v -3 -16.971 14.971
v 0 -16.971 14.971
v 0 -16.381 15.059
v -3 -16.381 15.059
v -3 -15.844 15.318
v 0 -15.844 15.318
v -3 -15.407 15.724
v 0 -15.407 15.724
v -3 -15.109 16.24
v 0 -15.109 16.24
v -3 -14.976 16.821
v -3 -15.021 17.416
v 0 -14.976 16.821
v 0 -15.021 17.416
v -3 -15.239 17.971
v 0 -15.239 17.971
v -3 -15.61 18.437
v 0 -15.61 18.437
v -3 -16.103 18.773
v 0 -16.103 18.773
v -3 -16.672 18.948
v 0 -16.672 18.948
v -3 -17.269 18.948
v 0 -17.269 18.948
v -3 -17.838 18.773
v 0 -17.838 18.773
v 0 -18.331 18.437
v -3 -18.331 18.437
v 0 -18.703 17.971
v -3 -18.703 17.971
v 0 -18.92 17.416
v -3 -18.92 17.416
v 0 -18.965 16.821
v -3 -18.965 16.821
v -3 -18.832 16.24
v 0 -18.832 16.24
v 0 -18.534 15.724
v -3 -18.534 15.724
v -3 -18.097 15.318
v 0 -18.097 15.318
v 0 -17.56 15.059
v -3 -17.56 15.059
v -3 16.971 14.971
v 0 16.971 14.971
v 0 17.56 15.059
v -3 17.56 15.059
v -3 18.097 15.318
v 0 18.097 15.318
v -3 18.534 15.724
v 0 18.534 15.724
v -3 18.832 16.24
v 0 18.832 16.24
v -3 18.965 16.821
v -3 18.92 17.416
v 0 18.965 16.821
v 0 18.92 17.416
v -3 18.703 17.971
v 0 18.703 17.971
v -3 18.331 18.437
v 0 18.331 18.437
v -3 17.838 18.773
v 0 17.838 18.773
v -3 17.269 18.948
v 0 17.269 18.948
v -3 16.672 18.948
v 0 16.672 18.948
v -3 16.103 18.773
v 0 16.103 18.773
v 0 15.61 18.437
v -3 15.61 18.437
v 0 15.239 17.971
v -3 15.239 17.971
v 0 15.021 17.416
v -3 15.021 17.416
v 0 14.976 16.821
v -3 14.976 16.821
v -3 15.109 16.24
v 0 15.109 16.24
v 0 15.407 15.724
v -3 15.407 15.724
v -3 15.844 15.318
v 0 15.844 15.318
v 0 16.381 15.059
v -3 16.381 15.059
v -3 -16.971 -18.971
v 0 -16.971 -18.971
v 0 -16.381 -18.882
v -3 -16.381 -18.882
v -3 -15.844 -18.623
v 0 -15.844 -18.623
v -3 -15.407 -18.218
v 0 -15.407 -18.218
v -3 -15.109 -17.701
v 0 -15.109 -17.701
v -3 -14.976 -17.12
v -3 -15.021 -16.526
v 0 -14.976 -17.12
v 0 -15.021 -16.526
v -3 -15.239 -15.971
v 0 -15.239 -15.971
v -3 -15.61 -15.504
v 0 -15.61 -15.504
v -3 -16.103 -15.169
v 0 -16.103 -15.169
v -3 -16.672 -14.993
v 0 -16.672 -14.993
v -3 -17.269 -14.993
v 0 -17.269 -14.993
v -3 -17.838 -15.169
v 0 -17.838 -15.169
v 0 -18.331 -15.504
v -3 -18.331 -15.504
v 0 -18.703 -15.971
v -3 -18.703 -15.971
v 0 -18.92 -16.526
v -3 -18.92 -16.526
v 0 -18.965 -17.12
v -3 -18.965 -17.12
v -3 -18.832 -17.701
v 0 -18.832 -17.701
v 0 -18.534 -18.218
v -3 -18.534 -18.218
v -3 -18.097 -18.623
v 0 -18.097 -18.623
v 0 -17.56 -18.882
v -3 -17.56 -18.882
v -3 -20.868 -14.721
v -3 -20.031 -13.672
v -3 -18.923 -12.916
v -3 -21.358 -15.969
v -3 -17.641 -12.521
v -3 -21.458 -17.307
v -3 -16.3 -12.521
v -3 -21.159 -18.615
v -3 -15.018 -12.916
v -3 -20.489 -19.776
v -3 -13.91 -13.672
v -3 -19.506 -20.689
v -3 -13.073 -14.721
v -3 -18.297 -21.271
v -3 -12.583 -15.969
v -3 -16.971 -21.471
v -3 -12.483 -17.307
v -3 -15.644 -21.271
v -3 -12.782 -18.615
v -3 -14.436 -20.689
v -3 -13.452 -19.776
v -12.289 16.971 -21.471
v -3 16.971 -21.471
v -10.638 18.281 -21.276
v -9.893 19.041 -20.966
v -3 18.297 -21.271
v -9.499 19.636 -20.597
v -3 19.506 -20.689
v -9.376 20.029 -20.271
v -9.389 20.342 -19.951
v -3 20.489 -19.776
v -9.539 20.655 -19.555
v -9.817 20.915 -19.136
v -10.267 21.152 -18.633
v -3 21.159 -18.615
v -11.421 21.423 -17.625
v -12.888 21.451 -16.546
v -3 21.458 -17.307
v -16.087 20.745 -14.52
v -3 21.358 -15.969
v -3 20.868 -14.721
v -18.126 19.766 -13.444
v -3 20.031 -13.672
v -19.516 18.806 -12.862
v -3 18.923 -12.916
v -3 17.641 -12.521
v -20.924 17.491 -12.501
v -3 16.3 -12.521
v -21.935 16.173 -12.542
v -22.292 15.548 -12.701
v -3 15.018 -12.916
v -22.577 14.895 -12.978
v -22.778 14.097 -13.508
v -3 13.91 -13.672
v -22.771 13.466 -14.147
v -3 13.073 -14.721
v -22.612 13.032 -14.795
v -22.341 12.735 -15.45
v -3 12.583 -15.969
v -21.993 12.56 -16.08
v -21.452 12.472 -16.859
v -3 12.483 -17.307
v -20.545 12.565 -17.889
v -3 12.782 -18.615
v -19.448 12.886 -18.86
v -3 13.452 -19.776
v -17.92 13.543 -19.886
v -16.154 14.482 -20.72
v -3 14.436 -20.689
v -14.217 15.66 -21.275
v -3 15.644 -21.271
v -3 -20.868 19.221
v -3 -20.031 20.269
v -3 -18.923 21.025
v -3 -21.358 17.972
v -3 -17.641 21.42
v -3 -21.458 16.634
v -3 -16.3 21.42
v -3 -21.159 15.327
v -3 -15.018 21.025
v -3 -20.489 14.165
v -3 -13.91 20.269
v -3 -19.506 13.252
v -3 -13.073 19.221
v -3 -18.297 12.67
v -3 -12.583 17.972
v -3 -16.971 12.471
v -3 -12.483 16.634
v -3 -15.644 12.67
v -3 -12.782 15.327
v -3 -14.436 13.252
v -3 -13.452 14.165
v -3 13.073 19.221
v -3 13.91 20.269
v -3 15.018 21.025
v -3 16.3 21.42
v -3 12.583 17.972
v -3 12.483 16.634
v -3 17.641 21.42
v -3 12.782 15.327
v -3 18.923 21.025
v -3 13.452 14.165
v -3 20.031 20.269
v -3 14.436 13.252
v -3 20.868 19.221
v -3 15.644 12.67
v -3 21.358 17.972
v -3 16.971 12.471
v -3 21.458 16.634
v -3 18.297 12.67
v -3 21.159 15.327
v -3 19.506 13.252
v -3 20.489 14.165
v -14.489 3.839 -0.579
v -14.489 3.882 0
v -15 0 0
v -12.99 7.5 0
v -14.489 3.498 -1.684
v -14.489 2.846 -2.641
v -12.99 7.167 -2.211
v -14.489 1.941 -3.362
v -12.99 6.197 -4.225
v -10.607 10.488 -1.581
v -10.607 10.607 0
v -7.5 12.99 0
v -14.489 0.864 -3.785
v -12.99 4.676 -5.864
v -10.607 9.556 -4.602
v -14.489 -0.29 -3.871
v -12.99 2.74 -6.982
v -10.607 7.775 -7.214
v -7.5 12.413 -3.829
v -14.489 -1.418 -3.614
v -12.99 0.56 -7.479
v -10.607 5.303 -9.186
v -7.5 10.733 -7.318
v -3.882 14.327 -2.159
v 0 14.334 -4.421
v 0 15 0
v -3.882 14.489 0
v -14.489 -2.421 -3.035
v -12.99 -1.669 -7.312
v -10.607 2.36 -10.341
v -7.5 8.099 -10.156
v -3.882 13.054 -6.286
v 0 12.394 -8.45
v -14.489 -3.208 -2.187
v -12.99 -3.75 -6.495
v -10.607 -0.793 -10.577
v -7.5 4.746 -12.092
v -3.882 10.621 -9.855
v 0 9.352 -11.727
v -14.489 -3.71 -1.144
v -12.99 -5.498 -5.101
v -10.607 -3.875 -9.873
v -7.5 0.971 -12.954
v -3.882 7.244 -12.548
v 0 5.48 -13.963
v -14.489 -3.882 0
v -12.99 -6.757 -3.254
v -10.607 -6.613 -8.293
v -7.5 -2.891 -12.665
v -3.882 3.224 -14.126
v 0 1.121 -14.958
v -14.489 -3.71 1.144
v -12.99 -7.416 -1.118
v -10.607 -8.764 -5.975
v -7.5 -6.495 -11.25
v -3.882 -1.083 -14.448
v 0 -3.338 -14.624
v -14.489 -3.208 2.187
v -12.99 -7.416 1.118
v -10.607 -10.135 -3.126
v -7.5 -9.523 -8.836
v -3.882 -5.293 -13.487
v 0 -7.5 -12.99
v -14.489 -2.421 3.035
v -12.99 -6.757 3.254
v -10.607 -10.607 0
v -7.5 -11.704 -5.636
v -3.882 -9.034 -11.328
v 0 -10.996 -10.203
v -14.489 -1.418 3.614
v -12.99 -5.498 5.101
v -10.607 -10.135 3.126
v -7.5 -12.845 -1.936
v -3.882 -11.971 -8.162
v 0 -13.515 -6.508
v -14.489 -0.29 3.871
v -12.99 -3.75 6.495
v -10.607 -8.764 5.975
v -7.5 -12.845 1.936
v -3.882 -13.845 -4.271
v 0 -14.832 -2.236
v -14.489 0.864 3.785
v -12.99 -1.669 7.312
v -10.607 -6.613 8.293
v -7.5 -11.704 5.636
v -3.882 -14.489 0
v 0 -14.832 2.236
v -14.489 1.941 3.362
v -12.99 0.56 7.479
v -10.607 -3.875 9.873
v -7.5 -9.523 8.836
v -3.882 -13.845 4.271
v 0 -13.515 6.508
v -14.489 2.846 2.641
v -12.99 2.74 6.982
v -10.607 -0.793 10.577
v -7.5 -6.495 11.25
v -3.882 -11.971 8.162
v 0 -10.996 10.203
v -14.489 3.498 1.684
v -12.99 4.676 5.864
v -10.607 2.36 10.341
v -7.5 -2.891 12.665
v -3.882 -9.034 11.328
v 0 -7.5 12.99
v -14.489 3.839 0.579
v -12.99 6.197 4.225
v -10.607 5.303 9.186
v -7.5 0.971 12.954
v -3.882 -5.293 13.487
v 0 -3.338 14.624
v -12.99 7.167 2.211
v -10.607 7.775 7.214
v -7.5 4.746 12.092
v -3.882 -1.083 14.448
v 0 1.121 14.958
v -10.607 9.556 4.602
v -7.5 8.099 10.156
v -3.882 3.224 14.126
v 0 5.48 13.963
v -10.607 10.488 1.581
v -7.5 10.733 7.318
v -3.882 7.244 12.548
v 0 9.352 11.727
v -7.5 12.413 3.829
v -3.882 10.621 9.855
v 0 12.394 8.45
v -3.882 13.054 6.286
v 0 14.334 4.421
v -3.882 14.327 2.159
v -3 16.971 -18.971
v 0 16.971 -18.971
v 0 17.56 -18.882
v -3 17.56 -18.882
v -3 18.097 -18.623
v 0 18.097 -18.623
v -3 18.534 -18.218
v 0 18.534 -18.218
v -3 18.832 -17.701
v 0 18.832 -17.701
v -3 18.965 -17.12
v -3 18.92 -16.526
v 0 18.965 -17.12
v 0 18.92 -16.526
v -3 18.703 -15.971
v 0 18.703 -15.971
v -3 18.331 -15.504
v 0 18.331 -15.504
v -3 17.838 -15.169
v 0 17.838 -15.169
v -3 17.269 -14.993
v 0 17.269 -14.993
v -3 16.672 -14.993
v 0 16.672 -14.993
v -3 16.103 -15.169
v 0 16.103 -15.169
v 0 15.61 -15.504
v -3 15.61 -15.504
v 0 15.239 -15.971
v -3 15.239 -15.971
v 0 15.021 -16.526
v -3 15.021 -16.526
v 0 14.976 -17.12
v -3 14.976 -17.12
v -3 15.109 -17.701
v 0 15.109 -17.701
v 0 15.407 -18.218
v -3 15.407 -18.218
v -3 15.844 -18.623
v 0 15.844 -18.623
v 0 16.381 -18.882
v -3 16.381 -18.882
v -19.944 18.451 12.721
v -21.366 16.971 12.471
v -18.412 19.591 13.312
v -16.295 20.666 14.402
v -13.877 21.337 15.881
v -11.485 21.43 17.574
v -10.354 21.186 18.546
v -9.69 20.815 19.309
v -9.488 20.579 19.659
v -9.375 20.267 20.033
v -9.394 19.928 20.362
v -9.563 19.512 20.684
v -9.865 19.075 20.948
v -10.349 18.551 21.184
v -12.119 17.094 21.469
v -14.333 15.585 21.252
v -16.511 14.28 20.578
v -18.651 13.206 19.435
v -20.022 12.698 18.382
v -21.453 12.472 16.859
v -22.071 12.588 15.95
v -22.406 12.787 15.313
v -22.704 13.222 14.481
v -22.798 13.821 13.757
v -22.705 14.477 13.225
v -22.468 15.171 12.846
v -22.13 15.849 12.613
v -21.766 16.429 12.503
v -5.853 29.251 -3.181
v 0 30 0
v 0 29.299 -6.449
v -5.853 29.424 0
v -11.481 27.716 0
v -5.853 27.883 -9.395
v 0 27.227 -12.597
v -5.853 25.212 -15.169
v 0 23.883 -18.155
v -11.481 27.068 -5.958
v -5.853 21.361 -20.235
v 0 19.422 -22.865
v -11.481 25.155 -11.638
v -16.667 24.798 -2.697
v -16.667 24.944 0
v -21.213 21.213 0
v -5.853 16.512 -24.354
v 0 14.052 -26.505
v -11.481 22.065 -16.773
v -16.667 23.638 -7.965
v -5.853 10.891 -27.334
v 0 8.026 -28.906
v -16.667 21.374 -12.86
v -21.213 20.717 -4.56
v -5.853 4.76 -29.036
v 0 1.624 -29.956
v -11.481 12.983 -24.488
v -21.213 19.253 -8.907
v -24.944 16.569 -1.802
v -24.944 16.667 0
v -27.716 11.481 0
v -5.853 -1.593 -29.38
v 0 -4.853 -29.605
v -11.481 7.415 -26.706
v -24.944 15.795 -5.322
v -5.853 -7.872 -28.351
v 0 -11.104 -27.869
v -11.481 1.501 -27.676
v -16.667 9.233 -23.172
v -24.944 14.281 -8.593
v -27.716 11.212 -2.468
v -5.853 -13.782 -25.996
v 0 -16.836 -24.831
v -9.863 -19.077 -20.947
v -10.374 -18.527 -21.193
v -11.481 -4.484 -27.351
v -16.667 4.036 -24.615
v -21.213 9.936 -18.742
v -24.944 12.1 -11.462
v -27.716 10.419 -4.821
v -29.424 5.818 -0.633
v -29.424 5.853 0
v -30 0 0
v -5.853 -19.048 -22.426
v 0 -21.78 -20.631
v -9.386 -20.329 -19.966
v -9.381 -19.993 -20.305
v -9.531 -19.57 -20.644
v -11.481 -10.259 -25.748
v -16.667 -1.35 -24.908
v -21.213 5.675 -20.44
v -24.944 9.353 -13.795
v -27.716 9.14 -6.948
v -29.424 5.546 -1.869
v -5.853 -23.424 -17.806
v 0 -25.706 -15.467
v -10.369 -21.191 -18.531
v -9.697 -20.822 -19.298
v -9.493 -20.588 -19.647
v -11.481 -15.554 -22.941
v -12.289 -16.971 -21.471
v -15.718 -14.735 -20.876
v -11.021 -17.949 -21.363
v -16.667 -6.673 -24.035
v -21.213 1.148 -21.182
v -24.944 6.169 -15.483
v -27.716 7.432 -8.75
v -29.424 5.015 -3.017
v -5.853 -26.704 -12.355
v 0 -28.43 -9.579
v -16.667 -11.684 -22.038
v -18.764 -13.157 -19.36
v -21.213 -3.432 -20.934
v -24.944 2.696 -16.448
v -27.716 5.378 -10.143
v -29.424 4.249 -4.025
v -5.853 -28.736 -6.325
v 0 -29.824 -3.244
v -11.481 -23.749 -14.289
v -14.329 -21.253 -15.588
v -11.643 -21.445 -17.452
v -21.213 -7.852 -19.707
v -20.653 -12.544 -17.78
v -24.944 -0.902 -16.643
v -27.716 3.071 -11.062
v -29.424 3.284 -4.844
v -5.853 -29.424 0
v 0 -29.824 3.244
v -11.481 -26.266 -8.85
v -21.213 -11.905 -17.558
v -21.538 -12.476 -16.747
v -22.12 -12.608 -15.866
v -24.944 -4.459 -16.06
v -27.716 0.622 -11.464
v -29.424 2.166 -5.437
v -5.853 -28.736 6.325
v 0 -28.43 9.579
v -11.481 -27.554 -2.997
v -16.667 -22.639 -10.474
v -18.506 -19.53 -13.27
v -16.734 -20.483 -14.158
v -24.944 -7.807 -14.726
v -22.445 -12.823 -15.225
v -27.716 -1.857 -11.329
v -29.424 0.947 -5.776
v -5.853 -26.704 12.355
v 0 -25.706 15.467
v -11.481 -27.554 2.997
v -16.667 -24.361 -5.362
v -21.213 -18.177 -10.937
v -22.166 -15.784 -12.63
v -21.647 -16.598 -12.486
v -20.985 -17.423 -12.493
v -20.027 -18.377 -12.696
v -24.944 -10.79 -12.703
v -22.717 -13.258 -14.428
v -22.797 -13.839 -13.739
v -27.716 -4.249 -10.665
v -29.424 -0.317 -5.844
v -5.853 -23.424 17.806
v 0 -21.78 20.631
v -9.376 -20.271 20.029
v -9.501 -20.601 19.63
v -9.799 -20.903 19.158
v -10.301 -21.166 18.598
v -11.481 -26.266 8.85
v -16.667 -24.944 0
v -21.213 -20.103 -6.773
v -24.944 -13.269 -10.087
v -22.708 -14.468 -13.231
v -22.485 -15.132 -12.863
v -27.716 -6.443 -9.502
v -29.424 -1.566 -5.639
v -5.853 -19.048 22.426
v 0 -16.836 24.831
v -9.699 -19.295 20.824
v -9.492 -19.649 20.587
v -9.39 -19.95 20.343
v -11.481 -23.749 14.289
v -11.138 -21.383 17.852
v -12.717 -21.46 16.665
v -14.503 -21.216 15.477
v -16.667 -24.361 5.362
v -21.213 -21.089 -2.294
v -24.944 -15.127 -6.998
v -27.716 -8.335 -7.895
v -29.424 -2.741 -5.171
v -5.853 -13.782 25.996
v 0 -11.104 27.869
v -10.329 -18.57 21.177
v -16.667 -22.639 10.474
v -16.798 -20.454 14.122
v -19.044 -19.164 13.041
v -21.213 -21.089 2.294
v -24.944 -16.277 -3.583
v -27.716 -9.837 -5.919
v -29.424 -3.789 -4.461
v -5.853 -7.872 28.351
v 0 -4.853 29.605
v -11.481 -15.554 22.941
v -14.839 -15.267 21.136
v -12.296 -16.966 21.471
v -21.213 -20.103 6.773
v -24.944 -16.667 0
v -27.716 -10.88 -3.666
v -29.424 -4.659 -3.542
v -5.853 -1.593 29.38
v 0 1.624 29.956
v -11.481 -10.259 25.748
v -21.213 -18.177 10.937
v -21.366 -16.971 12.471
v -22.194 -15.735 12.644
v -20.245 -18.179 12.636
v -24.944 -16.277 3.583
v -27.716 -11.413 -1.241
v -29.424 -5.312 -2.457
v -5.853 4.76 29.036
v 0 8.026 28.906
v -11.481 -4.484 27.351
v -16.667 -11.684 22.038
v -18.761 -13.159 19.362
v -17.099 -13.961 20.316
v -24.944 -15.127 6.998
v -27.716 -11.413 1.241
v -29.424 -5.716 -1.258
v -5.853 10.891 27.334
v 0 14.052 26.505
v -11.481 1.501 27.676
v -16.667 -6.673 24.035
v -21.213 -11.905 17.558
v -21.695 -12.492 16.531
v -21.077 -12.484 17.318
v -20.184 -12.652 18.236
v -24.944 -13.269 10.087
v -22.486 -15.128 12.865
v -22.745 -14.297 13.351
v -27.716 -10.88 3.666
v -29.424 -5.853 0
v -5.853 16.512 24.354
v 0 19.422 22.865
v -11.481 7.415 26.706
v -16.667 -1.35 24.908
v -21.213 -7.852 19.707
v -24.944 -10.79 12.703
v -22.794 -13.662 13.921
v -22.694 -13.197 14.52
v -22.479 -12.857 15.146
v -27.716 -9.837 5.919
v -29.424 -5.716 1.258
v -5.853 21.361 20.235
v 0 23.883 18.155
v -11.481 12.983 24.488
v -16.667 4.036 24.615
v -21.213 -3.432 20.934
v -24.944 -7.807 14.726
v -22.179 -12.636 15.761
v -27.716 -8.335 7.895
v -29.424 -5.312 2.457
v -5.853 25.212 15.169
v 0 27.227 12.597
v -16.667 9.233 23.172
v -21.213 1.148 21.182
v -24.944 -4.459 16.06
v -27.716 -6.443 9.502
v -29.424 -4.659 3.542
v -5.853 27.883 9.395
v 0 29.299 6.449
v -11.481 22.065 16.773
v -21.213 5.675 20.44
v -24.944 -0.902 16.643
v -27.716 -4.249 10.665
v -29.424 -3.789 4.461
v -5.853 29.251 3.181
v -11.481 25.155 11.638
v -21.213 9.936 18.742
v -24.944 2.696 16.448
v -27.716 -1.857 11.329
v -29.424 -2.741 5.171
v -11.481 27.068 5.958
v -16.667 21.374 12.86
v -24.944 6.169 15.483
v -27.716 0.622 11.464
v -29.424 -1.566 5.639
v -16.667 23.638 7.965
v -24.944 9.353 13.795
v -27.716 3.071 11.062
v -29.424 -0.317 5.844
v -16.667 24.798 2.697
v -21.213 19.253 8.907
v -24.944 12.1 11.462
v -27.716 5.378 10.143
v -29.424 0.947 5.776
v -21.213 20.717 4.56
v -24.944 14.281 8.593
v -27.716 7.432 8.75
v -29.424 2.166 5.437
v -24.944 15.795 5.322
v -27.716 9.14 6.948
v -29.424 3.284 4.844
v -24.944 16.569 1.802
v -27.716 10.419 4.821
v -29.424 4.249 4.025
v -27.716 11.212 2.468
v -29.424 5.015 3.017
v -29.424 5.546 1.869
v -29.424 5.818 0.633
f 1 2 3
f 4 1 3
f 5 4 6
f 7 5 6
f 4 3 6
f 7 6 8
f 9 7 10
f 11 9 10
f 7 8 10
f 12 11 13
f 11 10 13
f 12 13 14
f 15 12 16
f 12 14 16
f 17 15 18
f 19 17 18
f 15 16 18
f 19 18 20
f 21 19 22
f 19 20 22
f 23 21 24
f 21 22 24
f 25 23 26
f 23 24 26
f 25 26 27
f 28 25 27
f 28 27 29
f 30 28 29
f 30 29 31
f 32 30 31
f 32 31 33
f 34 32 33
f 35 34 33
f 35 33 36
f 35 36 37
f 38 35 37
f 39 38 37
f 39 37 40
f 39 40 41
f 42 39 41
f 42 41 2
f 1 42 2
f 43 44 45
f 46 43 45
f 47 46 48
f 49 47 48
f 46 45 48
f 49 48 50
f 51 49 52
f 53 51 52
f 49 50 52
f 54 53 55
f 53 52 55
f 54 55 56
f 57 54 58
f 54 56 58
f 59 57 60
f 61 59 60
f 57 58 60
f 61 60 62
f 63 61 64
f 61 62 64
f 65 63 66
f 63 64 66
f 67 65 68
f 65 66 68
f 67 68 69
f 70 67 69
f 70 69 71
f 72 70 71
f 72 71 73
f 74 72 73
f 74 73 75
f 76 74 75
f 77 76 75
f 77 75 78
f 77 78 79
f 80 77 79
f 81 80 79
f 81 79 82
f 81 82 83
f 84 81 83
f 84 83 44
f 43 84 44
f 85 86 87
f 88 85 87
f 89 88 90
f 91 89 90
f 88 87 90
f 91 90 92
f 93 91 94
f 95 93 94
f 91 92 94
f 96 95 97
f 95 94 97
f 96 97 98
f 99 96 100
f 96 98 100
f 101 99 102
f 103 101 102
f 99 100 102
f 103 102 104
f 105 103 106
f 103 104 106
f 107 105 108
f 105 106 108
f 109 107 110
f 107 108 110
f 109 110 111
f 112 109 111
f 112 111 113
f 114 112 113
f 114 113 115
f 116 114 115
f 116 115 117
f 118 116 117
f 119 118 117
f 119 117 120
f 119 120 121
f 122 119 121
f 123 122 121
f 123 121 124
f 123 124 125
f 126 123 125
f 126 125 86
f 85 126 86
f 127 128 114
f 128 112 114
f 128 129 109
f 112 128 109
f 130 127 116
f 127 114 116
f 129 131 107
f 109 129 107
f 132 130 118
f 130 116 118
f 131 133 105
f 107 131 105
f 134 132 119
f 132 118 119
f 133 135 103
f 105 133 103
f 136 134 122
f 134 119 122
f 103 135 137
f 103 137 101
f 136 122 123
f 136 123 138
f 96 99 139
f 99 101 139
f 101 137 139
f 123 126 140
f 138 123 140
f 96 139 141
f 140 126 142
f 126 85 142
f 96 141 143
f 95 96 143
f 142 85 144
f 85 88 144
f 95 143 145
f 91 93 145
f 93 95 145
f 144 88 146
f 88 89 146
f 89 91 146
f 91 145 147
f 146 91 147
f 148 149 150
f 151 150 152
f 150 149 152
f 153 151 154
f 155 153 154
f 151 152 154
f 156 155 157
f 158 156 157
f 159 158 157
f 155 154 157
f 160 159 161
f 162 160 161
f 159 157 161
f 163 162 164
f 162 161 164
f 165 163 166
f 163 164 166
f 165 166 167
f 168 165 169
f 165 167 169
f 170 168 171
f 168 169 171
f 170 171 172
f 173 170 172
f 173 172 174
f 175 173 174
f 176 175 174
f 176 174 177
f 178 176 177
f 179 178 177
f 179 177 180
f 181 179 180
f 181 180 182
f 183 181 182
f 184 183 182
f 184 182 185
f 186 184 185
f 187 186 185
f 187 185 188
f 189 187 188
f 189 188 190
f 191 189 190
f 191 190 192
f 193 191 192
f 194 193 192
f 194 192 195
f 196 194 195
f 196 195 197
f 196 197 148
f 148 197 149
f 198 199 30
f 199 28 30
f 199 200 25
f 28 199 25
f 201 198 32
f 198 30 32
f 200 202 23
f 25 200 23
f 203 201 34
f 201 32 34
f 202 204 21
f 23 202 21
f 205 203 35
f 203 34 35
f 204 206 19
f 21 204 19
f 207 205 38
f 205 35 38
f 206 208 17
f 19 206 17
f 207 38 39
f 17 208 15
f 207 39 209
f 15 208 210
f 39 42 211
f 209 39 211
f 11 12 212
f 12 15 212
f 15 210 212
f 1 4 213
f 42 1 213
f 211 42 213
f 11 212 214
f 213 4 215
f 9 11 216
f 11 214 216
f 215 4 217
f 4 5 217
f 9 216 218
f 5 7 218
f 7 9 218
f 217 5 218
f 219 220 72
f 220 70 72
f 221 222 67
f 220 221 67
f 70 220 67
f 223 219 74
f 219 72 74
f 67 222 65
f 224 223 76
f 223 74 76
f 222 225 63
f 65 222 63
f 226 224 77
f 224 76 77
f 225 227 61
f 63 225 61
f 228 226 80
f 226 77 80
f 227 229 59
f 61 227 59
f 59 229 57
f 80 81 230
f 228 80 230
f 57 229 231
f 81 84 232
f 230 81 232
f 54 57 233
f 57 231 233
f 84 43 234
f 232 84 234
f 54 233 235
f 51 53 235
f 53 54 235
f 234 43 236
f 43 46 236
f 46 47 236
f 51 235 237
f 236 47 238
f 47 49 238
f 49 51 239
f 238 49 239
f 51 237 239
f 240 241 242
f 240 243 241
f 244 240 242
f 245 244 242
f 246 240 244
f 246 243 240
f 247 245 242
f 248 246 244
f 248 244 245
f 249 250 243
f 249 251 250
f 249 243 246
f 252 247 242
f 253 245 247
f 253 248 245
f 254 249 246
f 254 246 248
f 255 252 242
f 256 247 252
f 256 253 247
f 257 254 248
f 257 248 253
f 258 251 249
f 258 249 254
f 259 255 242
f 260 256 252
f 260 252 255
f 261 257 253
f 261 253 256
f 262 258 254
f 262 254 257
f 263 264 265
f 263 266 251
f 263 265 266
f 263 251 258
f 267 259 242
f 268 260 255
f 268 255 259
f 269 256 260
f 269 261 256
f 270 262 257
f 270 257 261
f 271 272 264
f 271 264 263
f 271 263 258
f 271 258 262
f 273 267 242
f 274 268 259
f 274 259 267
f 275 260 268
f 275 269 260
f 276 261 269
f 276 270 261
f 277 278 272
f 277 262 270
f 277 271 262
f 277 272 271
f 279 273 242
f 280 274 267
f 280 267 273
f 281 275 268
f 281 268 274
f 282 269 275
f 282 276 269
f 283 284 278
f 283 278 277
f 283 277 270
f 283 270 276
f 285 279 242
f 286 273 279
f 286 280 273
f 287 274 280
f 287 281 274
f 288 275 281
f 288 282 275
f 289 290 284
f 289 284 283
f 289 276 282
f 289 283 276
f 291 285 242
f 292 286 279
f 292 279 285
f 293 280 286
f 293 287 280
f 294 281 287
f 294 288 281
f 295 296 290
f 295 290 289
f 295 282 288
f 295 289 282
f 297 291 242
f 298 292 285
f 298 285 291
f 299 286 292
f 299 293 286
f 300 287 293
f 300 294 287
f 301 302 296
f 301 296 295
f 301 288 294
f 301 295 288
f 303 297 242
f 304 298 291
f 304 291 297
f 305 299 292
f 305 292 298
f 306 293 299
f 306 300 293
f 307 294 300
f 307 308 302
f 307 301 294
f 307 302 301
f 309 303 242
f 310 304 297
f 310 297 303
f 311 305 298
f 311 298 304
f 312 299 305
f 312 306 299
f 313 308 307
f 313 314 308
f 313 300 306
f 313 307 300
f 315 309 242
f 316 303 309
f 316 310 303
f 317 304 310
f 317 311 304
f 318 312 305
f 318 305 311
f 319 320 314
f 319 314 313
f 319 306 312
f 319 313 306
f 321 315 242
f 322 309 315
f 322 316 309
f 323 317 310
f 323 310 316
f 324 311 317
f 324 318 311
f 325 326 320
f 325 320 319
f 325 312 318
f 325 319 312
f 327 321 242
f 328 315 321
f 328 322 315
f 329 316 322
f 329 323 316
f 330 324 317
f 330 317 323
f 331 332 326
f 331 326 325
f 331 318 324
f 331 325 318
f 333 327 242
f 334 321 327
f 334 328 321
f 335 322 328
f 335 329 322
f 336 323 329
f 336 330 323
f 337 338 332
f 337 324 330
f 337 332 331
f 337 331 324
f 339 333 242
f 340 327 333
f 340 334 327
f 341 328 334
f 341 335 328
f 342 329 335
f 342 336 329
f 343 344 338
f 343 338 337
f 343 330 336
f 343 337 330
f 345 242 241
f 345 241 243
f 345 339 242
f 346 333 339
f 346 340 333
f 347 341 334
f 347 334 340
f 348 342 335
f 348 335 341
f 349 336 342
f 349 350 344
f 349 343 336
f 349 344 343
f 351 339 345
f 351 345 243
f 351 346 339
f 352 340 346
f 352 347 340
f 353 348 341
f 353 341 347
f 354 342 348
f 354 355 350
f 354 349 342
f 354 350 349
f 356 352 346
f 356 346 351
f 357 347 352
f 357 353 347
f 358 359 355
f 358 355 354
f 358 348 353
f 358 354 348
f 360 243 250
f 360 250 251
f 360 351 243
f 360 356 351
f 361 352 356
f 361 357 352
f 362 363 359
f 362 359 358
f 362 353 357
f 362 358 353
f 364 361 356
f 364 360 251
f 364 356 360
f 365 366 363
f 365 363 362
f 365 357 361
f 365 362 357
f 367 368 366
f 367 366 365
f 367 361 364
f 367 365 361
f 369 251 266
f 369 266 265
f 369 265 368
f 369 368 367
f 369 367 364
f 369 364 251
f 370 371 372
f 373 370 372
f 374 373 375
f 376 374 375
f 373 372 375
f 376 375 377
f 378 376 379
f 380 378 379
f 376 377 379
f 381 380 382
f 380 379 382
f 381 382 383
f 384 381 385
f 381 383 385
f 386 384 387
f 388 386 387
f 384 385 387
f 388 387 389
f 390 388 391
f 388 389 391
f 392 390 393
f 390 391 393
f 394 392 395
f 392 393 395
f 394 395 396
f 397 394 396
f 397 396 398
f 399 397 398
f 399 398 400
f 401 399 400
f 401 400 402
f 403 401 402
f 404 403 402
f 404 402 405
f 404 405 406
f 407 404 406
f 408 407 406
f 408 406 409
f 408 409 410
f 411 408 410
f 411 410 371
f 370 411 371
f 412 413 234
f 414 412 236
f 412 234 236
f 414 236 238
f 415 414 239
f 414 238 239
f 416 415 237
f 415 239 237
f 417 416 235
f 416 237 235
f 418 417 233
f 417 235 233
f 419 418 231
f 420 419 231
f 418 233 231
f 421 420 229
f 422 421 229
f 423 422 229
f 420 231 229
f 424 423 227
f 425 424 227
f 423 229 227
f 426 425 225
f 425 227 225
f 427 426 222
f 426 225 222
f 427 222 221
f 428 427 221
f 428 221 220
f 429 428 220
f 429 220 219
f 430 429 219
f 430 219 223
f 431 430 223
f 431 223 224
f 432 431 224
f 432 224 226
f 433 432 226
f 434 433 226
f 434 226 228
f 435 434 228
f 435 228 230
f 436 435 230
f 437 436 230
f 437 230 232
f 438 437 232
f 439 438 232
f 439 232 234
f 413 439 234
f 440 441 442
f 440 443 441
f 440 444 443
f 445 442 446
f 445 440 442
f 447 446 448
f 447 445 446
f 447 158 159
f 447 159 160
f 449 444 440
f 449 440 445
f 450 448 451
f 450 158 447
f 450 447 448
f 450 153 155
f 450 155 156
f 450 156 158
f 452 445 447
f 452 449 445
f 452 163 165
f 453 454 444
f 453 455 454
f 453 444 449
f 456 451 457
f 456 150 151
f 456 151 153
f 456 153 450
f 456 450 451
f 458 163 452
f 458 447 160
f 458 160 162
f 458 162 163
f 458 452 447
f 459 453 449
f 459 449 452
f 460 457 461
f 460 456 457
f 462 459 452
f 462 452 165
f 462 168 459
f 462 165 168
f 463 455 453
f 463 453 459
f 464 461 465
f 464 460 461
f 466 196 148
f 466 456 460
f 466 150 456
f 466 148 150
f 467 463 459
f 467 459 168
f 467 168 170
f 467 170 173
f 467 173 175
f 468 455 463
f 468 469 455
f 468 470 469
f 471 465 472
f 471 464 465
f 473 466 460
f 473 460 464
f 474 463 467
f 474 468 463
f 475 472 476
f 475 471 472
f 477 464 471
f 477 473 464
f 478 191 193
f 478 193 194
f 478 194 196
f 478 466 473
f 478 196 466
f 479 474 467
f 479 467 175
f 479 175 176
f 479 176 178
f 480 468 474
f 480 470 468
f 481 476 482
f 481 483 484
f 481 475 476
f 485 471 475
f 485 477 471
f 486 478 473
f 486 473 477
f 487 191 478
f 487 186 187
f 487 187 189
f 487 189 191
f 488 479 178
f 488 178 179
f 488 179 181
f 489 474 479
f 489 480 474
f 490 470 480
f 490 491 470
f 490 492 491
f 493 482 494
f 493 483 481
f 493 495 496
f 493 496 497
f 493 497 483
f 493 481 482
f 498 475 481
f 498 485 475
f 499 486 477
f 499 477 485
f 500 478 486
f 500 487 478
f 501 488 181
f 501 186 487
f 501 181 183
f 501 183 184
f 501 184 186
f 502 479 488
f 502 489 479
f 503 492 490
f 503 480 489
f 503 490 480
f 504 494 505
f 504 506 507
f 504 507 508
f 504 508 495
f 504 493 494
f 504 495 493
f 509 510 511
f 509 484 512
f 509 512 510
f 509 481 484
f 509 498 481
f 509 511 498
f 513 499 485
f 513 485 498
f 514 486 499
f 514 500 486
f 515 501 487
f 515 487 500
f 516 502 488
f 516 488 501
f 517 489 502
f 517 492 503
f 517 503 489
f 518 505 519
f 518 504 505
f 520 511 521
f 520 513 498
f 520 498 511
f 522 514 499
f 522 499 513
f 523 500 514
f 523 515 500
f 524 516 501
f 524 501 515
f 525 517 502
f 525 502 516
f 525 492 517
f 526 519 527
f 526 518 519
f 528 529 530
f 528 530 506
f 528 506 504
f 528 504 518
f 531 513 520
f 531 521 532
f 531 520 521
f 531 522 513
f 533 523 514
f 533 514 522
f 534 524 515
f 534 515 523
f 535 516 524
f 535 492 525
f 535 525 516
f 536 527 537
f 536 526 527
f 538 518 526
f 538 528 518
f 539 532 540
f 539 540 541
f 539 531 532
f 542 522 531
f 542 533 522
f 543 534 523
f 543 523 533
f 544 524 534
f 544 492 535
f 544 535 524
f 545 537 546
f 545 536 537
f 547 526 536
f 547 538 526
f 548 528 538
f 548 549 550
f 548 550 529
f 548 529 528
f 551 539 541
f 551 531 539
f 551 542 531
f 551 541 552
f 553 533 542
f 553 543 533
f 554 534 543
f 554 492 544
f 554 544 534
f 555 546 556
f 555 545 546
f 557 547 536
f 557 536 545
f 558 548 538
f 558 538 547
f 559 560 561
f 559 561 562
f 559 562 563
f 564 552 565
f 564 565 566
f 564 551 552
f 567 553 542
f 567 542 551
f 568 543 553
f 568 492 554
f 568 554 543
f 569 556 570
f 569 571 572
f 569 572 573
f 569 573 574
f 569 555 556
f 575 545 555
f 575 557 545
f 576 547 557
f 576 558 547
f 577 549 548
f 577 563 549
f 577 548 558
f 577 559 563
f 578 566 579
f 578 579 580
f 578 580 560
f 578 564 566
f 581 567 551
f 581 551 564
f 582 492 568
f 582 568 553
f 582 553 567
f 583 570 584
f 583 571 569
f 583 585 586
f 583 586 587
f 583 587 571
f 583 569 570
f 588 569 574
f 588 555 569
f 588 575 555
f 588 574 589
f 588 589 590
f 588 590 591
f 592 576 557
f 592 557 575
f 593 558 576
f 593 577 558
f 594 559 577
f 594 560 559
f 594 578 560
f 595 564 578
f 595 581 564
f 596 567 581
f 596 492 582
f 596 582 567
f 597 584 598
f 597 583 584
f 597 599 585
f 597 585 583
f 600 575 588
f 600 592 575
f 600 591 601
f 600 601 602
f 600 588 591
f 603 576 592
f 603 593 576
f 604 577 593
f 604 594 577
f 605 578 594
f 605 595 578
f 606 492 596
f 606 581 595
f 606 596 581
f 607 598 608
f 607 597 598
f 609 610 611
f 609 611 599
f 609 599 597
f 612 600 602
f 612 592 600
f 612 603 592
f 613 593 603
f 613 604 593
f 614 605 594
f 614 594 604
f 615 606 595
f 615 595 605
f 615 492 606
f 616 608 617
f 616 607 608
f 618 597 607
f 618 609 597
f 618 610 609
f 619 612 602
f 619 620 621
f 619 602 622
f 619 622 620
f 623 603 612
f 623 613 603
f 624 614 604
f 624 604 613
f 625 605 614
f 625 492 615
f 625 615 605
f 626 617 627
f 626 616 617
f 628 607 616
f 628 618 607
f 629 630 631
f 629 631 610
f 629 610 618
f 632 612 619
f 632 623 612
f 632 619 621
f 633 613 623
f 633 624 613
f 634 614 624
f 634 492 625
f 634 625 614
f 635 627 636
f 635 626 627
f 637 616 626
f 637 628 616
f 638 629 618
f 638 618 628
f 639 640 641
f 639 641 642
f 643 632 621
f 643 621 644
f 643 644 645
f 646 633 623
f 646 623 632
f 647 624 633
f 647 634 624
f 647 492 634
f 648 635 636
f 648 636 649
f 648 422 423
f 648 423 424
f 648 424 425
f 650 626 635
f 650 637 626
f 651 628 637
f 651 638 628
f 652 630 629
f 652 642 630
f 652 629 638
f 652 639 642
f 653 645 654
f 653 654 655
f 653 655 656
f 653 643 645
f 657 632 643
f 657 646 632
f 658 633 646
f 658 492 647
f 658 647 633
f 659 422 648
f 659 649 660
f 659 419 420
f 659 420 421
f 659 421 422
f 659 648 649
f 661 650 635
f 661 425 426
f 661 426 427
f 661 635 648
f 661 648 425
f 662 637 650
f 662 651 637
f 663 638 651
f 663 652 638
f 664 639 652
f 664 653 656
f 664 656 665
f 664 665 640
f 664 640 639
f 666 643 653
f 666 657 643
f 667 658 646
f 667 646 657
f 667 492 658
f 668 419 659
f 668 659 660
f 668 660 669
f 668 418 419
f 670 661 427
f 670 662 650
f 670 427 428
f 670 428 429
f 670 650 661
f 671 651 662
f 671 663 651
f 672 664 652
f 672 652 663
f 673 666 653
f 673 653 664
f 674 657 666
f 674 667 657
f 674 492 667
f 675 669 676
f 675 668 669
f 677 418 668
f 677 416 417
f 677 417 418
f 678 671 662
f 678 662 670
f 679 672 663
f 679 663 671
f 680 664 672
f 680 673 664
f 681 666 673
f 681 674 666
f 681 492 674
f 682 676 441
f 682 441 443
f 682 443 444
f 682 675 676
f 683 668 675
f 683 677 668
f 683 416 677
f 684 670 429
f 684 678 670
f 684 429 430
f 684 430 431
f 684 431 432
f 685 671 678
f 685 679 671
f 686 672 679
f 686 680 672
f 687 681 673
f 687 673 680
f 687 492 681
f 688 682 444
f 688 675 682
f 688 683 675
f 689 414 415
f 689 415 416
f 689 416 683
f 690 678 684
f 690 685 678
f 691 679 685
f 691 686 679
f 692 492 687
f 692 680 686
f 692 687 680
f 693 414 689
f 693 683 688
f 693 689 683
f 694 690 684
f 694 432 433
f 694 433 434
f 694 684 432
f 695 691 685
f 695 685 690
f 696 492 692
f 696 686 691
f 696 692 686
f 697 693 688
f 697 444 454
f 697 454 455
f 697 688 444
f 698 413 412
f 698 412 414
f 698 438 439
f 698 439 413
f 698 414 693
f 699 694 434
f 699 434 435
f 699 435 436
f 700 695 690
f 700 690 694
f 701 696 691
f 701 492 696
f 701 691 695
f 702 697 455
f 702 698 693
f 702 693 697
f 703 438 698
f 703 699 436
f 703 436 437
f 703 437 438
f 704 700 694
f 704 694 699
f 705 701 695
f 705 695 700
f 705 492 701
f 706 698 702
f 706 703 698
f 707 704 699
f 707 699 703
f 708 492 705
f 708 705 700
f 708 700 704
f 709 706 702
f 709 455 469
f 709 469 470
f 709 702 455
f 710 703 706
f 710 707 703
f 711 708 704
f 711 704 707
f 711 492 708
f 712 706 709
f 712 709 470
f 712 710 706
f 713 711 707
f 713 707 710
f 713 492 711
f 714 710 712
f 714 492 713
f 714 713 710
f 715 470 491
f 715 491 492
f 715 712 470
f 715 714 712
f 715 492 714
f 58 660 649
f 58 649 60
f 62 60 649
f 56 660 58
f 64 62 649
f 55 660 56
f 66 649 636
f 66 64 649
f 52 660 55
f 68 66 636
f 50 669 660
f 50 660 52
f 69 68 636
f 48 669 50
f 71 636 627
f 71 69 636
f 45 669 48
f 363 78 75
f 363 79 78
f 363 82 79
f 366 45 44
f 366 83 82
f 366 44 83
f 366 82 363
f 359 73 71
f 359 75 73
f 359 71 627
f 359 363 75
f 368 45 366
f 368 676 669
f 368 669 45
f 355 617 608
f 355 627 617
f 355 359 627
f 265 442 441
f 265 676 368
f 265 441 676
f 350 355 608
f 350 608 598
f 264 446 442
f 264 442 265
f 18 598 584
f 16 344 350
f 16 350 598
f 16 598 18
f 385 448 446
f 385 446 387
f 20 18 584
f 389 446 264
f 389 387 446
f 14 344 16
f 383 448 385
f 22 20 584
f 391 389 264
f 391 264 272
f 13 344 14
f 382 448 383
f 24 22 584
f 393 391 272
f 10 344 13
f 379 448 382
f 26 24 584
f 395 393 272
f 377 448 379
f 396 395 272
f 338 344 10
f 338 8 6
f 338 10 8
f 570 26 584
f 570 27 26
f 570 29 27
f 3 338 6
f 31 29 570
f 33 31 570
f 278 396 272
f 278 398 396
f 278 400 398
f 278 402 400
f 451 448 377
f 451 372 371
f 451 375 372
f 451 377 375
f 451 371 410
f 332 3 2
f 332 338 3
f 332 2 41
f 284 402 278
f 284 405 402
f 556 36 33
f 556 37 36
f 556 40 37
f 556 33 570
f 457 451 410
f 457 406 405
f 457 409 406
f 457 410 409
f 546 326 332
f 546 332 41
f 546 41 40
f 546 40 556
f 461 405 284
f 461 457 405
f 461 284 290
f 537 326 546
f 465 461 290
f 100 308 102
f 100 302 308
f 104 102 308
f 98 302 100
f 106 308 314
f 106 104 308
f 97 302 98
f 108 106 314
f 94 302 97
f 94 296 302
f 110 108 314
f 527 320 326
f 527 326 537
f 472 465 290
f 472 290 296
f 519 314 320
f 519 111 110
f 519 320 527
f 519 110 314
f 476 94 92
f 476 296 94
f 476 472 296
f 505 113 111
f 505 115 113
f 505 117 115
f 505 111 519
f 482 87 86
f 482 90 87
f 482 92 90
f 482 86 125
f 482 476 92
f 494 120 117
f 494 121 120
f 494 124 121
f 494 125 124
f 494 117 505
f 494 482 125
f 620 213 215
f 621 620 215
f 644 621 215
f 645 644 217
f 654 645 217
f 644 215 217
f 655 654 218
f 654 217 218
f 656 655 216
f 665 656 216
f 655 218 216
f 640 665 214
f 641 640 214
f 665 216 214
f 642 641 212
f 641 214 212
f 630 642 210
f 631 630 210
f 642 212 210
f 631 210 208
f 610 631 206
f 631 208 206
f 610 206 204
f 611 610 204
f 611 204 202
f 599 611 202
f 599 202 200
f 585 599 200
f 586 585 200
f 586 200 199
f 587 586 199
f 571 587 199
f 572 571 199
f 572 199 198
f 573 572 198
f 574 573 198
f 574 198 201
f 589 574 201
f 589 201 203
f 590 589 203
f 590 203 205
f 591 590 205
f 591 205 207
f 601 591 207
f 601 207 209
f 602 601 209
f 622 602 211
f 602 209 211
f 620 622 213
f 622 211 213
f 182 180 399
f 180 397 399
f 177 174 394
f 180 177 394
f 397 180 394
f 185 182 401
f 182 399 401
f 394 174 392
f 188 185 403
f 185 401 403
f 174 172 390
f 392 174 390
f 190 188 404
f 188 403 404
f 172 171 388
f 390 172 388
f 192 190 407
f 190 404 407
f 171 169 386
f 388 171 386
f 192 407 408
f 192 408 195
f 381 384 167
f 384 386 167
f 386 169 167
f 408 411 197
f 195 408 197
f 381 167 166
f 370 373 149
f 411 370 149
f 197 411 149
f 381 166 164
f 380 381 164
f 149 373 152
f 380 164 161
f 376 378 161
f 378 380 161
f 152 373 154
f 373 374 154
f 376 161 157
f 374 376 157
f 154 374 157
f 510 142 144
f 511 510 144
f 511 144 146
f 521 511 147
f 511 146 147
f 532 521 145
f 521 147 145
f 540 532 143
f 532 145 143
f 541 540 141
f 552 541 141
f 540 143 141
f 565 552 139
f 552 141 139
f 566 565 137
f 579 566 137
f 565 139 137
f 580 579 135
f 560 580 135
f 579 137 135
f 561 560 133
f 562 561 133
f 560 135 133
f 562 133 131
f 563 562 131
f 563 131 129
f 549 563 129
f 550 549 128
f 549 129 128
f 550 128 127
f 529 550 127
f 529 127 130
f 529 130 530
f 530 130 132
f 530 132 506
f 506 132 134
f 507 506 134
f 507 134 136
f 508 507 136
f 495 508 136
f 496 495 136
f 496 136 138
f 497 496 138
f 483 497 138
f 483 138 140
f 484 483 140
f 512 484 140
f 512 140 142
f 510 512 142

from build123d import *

# Parameters (mm, degrees)
SKETCH4_R               = 2
CUT_EXTRUDE3_DEPTH      = 1
CUT_EXTRUDE3_DEPTH_BACK = 31
SKETCH5_R               = 4.5
CUT_EXTRUDE4_DEPTH      = 28


with BuildPart() as part:
    # Sketch3 → Revolve1 (revolve)
    with BuildSketch(Plane.XY):
        with BuildLine():
            Line((-30, 0), (-15, 0))
            ThreePointArc((-15, 0), (-10.606601718, 10.606601718), (0, 15))
            Line((0, 15), (0, 30))
            ThreePointArc((0, 30), (-21.213203436, 21.213203436), (-30, 0))
        make_face()
    revolve(axis=Axis((0, 0, 0), (-1, 0, 0)))

    # Sketch4 → Cut-Extrude3 (cut, two sides)
    with BuildSketch(Plane(origin=(0, 0, 0), x_dir=(0, 0, -1), z_dir=(1, 0, 0))) as cut_extrude3_sk:
        with Locations((-16.970562748, 16.970562748)):
            Circle(SKETCH4_R)
        with Locations((16.970562748, 16.970562748)):
            Circle(SKETCH4_R)
        with Locations((16.970562748, -16.970562748)):
            Circle(SKETCH4_R)
        with Locations((-16.970562748, -16.970562748)):
            Circle(SKETCH4_R)
    extrude(amount=CUT_EXTRUDE3_DEPTH, mode=Mode.SUBTRACT)
    extrude(cut_extrude3_sk.sketch, amount=-CUT_EXTRUDE3_DEPTH_BACK, mode=Mode.SUBTRACT)

    # Sketch5 → Cut-Extrude4 (cut, through all)
    with BuildSketch(Plane(origin=(-3, 0, 0), x_dir=(0, 0, -1), z_dir=(1, 0, 0))):
        with Locations((-16.970562748, 16.970562748)):
            Circle(SKETCH5_R)
        with Locations((16.970562748, 16.970562748)):
            Circle(SKETCH5_R)
        with Locations((16.970562748, -16.970562748)):
            Circle(SKETCH5_R)
        with Locations((-16.970562748, -16.970562748)):
            Circle(SKETCH5_R)
    extrude(amount=-CUT_EXTRUDE4_DEPTH, mode=Mode.SUBTRACT)


solid = part.part
